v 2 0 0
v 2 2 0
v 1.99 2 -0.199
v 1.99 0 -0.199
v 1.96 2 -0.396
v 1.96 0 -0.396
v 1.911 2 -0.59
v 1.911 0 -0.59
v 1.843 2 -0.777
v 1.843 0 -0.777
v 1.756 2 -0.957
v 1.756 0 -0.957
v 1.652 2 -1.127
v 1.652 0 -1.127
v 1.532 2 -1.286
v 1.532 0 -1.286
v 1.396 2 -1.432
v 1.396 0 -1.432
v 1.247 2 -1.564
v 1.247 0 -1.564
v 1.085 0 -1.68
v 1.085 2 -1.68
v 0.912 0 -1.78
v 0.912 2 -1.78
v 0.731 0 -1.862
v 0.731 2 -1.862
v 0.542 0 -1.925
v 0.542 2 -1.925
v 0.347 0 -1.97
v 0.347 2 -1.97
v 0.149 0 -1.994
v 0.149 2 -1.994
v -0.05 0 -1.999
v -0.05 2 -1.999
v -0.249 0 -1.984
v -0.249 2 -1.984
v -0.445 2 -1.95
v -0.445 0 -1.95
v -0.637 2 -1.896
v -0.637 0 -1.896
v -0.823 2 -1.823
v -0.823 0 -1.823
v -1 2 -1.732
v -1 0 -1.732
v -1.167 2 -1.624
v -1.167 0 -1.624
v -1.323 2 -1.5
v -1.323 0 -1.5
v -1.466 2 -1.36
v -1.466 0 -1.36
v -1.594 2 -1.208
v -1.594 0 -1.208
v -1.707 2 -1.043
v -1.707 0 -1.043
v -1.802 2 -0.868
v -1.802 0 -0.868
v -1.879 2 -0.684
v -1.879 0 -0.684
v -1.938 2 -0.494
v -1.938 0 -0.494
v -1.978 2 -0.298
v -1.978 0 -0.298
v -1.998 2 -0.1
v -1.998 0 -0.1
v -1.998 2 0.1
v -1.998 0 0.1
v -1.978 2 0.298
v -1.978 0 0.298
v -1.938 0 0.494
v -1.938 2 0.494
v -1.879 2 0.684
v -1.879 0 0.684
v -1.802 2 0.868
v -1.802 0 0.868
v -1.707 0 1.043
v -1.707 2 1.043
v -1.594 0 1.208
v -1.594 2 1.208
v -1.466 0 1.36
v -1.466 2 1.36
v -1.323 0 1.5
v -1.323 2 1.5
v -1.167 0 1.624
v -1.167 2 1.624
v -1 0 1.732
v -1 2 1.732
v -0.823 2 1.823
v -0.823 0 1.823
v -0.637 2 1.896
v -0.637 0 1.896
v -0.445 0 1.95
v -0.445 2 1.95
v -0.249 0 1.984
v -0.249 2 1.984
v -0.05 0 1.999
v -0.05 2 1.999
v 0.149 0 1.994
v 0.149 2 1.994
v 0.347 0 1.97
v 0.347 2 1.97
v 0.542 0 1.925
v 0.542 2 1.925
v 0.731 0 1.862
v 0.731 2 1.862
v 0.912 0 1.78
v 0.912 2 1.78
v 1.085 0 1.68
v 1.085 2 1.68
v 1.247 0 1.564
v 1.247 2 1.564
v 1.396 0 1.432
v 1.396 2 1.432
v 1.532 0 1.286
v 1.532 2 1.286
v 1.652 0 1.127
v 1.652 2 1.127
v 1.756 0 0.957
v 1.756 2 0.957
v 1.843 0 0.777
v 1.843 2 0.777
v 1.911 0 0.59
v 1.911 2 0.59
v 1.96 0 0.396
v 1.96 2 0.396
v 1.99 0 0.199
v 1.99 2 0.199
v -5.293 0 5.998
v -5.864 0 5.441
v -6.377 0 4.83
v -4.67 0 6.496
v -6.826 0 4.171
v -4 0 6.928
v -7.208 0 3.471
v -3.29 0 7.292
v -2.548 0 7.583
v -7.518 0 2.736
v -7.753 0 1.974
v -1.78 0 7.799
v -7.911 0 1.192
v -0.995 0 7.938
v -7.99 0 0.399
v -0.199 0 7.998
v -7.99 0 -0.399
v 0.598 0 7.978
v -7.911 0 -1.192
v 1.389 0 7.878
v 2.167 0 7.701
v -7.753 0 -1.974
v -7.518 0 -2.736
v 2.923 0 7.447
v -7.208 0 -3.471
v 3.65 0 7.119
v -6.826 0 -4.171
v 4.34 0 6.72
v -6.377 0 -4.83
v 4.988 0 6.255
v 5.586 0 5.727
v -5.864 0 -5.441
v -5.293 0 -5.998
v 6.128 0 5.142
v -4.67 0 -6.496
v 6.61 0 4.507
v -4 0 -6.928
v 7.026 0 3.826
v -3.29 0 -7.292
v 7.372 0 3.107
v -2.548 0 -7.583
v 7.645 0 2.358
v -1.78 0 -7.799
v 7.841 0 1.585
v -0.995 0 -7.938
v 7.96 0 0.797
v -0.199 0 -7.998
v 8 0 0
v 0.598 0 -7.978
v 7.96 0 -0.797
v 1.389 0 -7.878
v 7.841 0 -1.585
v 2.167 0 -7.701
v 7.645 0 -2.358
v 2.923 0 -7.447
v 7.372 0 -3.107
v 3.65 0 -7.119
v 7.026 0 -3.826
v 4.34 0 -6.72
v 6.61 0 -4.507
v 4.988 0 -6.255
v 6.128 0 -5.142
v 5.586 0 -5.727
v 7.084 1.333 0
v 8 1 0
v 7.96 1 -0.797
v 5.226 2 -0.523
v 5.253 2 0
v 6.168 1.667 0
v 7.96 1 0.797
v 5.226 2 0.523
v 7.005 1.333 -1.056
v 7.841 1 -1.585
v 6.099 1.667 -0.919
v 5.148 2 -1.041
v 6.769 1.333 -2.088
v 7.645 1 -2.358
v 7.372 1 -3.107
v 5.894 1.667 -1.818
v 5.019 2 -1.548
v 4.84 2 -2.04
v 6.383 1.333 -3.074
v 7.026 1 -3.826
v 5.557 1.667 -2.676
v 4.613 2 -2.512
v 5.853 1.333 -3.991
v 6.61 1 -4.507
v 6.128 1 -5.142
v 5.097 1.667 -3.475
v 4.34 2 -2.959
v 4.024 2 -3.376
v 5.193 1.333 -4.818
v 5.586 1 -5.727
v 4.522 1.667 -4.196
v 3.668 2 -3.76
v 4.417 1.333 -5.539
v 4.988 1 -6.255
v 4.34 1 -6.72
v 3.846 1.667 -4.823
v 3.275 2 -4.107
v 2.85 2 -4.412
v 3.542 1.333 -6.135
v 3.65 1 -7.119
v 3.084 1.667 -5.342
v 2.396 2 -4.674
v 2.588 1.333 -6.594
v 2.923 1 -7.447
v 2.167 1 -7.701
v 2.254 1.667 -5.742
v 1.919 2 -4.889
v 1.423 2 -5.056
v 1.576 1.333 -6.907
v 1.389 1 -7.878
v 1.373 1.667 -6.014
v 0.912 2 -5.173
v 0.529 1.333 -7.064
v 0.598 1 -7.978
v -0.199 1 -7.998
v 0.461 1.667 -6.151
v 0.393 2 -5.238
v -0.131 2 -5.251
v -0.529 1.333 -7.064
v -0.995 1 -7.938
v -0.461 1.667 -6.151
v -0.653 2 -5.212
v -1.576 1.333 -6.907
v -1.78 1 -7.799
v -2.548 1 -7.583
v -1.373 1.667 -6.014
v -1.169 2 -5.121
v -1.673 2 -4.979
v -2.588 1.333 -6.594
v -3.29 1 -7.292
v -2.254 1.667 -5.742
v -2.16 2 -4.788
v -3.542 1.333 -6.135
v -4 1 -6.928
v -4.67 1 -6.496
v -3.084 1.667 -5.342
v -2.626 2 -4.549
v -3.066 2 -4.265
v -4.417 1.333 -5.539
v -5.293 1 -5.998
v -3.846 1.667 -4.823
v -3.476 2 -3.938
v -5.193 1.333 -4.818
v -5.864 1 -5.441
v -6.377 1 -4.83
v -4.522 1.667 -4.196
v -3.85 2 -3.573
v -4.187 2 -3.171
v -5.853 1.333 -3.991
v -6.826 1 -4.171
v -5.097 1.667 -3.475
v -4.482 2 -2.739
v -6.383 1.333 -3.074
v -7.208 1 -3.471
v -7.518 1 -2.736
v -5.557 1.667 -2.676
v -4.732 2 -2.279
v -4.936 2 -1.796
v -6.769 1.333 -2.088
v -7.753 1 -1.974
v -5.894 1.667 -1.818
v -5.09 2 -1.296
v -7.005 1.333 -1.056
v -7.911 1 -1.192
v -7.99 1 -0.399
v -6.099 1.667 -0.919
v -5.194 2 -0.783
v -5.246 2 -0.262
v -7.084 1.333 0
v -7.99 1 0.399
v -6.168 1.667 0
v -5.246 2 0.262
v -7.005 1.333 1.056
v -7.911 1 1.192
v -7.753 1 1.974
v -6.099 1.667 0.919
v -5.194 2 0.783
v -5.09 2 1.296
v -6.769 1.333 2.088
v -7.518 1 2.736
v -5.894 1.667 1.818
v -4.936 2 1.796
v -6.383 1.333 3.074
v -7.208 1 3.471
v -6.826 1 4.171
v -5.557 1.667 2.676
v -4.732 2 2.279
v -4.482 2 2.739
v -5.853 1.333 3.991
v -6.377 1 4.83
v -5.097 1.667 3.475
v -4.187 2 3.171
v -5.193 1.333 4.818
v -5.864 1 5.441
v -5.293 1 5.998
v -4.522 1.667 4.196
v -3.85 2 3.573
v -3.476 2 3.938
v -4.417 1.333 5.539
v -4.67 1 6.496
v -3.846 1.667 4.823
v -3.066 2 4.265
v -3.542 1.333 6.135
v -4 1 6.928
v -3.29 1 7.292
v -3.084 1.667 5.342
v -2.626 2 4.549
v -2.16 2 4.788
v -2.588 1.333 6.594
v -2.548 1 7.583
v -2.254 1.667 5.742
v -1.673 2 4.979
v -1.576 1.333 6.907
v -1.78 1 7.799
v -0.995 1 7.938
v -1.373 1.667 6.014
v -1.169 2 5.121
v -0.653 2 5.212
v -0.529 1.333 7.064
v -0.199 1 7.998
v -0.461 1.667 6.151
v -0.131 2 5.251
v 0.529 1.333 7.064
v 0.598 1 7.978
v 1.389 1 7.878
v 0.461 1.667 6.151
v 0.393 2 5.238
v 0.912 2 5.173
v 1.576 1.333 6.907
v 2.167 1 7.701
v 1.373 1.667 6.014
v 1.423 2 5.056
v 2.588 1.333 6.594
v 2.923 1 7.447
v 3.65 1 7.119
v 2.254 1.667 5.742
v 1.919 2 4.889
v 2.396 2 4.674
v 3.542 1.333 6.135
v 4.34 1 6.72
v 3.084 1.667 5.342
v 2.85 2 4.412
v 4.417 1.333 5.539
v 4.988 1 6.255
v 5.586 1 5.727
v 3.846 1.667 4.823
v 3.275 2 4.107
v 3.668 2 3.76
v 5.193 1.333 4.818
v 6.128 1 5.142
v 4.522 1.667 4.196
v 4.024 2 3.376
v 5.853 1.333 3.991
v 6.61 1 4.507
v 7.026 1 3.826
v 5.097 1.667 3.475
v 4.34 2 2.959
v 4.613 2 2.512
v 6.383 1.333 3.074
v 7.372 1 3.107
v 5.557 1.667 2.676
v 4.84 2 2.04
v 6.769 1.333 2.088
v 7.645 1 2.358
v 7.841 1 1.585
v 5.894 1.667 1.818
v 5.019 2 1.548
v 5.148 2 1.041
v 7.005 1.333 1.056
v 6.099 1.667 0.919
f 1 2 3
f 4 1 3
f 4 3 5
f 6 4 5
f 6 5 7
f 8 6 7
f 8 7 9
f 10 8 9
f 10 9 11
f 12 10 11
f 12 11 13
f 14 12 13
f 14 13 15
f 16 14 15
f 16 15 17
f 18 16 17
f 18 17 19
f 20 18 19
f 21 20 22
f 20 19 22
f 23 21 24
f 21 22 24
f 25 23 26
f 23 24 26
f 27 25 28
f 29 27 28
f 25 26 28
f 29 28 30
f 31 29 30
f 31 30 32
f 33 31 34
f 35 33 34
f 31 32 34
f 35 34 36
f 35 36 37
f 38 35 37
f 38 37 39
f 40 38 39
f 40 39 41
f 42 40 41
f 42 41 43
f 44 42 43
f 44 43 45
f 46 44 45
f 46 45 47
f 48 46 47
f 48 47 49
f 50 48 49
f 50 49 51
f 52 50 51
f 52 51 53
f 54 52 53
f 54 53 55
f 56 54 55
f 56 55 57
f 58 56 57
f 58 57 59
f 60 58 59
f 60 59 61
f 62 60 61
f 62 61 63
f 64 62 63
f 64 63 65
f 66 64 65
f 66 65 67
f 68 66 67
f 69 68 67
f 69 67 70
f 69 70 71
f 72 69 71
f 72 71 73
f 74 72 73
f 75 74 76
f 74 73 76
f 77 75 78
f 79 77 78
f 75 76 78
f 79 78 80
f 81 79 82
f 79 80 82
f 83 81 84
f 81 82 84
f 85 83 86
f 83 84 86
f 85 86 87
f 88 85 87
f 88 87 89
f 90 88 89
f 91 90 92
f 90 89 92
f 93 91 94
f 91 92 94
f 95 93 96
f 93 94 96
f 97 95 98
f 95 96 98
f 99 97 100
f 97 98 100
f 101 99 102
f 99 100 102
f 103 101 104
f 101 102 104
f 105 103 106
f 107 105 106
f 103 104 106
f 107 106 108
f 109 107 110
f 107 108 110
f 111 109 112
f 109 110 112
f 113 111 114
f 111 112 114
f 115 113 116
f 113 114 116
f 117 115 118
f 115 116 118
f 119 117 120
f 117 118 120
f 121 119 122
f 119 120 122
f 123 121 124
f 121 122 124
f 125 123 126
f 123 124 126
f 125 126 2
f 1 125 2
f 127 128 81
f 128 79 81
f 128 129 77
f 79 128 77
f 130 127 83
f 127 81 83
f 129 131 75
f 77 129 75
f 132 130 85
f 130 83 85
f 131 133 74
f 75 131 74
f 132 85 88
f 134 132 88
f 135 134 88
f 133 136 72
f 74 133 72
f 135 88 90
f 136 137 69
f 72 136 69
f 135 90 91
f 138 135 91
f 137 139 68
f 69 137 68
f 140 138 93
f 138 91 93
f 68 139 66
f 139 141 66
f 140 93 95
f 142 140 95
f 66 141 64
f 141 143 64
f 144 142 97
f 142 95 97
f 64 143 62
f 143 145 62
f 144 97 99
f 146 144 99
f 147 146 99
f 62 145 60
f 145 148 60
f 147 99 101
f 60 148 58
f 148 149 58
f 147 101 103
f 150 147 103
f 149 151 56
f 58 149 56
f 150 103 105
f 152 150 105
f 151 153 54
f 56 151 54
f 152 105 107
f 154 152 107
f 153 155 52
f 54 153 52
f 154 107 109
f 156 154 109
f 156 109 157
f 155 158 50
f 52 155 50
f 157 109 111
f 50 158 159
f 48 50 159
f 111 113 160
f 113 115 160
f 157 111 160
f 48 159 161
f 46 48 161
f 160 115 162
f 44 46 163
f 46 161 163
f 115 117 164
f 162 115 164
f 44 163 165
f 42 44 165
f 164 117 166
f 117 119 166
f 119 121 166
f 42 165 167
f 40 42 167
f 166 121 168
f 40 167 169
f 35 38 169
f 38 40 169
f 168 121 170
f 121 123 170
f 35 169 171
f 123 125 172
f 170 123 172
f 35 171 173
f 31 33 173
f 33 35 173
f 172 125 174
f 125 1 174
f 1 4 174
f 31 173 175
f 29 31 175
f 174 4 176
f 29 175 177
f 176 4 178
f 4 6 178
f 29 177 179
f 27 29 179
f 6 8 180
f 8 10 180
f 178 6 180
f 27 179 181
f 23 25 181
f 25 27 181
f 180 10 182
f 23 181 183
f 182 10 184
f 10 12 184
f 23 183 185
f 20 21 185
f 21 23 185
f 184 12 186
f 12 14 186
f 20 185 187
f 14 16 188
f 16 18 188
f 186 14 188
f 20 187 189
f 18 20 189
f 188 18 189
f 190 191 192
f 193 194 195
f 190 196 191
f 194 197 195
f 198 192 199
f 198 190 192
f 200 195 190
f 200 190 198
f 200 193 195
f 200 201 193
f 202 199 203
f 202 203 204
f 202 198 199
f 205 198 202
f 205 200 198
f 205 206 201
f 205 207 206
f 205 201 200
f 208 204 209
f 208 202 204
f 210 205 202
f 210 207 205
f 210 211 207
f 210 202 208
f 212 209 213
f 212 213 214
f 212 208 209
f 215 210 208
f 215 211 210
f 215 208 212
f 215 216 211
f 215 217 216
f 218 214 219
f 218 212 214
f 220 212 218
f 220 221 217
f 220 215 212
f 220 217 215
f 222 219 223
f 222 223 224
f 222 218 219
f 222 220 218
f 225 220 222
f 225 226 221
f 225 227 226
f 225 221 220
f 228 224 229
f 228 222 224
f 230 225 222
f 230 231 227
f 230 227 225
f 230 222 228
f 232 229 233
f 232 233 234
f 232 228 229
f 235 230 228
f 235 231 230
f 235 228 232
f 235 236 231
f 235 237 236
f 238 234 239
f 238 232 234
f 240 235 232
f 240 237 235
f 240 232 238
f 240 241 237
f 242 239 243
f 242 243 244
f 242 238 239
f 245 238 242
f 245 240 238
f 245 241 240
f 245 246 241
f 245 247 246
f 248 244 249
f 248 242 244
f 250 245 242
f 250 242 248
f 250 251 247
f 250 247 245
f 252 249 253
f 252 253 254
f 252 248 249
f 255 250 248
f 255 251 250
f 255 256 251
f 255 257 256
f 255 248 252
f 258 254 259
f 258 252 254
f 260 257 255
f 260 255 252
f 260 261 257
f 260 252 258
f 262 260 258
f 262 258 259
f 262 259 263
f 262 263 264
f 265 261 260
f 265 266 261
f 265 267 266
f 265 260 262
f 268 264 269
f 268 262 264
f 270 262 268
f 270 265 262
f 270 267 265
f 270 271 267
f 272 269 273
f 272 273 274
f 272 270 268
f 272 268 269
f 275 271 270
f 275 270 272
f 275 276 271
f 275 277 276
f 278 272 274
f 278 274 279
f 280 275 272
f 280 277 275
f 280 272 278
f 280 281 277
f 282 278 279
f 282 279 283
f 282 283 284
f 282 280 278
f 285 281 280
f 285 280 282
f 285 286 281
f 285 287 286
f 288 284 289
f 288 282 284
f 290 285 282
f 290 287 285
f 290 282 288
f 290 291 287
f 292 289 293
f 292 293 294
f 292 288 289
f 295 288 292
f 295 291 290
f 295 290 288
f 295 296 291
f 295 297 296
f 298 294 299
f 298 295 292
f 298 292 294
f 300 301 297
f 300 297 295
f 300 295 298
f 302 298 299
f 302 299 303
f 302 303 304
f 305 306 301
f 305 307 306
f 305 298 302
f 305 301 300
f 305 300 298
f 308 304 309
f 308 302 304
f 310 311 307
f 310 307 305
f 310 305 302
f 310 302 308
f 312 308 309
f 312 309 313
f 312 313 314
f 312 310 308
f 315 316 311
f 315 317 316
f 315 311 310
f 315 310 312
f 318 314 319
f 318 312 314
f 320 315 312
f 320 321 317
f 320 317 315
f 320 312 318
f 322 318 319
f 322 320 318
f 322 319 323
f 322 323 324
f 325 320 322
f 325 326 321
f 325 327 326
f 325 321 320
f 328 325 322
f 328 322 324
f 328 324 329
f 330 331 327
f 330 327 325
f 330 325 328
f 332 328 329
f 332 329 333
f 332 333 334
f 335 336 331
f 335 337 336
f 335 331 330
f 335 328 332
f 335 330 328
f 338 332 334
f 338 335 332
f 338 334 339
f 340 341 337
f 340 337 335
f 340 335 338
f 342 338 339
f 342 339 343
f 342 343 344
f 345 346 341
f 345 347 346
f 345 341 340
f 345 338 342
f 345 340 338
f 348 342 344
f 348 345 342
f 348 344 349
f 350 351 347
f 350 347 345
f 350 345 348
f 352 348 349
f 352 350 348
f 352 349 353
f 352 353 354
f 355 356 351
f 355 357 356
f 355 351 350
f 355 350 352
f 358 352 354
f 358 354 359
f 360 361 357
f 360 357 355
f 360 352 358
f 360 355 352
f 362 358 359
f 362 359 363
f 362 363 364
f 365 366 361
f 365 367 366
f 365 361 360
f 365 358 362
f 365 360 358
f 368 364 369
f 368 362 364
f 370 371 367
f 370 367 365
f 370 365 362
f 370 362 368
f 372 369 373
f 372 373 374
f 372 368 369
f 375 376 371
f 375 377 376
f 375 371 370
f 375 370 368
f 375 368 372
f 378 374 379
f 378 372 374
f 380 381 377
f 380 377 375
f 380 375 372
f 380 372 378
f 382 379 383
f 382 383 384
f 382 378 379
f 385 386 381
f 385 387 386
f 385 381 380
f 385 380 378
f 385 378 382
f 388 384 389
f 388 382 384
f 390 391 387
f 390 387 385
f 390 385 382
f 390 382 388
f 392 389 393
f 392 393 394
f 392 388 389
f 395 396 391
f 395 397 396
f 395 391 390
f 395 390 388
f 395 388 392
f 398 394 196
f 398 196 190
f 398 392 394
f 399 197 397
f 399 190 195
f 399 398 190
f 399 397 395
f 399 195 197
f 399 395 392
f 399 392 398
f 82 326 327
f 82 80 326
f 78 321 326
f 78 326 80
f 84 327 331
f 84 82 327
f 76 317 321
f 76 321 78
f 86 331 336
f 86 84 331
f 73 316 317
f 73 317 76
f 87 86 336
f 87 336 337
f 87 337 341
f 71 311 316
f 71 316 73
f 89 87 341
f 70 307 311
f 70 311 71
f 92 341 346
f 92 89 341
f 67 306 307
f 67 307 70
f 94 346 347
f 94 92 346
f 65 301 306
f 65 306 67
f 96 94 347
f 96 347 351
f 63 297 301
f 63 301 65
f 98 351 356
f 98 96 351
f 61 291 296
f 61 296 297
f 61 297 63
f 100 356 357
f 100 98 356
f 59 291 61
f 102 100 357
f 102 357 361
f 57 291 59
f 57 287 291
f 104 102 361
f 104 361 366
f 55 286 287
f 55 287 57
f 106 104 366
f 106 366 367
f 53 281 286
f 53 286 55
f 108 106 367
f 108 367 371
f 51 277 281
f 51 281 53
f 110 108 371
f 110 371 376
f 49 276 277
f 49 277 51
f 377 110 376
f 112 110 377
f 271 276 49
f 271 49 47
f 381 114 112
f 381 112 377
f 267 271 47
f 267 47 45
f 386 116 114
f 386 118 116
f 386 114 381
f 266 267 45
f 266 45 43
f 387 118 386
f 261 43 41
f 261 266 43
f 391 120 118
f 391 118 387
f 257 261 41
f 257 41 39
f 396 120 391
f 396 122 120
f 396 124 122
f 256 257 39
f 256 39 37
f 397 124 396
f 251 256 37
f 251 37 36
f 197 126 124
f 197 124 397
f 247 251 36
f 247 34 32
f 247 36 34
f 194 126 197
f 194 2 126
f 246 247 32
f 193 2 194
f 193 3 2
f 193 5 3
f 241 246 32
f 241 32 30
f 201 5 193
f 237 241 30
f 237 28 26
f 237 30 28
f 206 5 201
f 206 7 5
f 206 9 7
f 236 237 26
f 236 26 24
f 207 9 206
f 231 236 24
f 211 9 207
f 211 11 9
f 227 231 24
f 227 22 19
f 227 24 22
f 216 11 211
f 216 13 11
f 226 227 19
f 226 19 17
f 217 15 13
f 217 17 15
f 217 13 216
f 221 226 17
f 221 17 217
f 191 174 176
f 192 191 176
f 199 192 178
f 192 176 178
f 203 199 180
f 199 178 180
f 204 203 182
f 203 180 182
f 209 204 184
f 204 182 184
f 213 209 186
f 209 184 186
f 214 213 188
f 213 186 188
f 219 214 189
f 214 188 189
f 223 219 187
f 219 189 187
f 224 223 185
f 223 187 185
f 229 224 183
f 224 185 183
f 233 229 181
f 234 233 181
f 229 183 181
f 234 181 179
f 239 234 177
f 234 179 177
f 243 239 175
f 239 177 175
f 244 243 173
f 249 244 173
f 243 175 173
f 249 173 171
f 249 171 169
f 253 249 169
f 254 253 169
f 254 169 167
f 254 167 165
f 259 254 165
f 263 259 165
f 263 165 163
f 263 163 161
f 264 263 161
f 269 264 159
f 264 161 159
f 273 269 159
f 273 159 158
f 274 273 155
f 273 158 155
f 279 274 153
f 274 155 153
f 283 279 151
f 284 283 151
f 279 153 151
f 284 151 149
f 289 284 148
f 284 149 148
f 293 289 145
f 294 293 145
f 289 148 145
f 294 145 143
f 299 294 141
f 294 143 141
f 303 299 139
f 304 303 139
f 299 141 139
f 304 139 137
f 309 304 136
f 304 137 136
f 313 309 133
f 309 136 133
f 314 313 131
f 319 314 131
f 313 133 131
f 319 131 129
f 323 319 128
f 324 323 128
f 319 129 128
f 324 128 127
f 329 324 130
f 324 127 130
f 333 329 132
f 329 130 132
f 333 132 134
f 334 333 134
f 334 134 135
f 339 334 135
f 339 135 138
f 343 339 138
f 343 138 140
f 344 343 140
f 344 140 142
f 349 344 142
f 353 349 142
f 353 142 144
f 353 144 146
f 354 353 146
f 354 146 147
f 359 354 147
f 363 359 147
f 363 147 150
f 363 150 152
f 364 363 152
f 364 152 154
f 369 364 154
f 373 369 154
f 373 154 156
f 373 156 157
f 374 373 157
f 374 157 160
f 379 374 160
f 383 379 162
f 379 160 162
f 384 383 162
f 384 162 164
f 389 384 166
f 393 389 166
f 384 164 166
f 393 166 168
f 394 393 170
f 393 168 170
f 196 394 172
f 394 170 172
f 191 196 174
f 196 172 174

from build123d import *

# Parameters (mm, degrees)
SKETCH1_R           = 8
BOSS_EXTRUDE1_DEPTH = 2
CHAMFER1_SIZE       = 1
CHAMFER1_SIZE2      = 2.747477419
SKETCH2_R           = 2
CUT_EXTRUDE1_DEPTH  = 3


with BuildPart() as part:
    # Sketch1 → Boss-Extrude1 (new body)
    with BuildSketch(Plane(origin=(0, 0, 0), x_dir=(1, 0, 0), z_dir=(0, 1, 0))):
        Circle(SKETCH1_R)
    extrude(amount=BOSS_EXTRUDE1_DEPTH)

    # Chamfer1
    chamfer1_edges = [part.edges().sort_by_distance(p)[0] for p in [
        (-8, 2, 0),
    ]]
    chamfer1_side = [part.faces().sort_by_distance(p)[0] for p in [
        (-8, 1, 0),
    ]]
    chamfer(chamfer1_edges, length=CHAMFER1_SIZE, length2=CHAMFER1_SIZE2, reference=chamfer1_side[0])

    # Sketch2 → Cut-Extrude1 (cut, through all)
    with BuildSketch(Plane(origin=(0, 2, 0), x_dir=(1, 0, 0), z_dir=(0, 1, 0))):
        Circle(SKETCH2_R)
    extrude(amount=-CUT_EXTRUDE1_DEPTH, mode=Mode.SUBTRACT)


solid = part.part
